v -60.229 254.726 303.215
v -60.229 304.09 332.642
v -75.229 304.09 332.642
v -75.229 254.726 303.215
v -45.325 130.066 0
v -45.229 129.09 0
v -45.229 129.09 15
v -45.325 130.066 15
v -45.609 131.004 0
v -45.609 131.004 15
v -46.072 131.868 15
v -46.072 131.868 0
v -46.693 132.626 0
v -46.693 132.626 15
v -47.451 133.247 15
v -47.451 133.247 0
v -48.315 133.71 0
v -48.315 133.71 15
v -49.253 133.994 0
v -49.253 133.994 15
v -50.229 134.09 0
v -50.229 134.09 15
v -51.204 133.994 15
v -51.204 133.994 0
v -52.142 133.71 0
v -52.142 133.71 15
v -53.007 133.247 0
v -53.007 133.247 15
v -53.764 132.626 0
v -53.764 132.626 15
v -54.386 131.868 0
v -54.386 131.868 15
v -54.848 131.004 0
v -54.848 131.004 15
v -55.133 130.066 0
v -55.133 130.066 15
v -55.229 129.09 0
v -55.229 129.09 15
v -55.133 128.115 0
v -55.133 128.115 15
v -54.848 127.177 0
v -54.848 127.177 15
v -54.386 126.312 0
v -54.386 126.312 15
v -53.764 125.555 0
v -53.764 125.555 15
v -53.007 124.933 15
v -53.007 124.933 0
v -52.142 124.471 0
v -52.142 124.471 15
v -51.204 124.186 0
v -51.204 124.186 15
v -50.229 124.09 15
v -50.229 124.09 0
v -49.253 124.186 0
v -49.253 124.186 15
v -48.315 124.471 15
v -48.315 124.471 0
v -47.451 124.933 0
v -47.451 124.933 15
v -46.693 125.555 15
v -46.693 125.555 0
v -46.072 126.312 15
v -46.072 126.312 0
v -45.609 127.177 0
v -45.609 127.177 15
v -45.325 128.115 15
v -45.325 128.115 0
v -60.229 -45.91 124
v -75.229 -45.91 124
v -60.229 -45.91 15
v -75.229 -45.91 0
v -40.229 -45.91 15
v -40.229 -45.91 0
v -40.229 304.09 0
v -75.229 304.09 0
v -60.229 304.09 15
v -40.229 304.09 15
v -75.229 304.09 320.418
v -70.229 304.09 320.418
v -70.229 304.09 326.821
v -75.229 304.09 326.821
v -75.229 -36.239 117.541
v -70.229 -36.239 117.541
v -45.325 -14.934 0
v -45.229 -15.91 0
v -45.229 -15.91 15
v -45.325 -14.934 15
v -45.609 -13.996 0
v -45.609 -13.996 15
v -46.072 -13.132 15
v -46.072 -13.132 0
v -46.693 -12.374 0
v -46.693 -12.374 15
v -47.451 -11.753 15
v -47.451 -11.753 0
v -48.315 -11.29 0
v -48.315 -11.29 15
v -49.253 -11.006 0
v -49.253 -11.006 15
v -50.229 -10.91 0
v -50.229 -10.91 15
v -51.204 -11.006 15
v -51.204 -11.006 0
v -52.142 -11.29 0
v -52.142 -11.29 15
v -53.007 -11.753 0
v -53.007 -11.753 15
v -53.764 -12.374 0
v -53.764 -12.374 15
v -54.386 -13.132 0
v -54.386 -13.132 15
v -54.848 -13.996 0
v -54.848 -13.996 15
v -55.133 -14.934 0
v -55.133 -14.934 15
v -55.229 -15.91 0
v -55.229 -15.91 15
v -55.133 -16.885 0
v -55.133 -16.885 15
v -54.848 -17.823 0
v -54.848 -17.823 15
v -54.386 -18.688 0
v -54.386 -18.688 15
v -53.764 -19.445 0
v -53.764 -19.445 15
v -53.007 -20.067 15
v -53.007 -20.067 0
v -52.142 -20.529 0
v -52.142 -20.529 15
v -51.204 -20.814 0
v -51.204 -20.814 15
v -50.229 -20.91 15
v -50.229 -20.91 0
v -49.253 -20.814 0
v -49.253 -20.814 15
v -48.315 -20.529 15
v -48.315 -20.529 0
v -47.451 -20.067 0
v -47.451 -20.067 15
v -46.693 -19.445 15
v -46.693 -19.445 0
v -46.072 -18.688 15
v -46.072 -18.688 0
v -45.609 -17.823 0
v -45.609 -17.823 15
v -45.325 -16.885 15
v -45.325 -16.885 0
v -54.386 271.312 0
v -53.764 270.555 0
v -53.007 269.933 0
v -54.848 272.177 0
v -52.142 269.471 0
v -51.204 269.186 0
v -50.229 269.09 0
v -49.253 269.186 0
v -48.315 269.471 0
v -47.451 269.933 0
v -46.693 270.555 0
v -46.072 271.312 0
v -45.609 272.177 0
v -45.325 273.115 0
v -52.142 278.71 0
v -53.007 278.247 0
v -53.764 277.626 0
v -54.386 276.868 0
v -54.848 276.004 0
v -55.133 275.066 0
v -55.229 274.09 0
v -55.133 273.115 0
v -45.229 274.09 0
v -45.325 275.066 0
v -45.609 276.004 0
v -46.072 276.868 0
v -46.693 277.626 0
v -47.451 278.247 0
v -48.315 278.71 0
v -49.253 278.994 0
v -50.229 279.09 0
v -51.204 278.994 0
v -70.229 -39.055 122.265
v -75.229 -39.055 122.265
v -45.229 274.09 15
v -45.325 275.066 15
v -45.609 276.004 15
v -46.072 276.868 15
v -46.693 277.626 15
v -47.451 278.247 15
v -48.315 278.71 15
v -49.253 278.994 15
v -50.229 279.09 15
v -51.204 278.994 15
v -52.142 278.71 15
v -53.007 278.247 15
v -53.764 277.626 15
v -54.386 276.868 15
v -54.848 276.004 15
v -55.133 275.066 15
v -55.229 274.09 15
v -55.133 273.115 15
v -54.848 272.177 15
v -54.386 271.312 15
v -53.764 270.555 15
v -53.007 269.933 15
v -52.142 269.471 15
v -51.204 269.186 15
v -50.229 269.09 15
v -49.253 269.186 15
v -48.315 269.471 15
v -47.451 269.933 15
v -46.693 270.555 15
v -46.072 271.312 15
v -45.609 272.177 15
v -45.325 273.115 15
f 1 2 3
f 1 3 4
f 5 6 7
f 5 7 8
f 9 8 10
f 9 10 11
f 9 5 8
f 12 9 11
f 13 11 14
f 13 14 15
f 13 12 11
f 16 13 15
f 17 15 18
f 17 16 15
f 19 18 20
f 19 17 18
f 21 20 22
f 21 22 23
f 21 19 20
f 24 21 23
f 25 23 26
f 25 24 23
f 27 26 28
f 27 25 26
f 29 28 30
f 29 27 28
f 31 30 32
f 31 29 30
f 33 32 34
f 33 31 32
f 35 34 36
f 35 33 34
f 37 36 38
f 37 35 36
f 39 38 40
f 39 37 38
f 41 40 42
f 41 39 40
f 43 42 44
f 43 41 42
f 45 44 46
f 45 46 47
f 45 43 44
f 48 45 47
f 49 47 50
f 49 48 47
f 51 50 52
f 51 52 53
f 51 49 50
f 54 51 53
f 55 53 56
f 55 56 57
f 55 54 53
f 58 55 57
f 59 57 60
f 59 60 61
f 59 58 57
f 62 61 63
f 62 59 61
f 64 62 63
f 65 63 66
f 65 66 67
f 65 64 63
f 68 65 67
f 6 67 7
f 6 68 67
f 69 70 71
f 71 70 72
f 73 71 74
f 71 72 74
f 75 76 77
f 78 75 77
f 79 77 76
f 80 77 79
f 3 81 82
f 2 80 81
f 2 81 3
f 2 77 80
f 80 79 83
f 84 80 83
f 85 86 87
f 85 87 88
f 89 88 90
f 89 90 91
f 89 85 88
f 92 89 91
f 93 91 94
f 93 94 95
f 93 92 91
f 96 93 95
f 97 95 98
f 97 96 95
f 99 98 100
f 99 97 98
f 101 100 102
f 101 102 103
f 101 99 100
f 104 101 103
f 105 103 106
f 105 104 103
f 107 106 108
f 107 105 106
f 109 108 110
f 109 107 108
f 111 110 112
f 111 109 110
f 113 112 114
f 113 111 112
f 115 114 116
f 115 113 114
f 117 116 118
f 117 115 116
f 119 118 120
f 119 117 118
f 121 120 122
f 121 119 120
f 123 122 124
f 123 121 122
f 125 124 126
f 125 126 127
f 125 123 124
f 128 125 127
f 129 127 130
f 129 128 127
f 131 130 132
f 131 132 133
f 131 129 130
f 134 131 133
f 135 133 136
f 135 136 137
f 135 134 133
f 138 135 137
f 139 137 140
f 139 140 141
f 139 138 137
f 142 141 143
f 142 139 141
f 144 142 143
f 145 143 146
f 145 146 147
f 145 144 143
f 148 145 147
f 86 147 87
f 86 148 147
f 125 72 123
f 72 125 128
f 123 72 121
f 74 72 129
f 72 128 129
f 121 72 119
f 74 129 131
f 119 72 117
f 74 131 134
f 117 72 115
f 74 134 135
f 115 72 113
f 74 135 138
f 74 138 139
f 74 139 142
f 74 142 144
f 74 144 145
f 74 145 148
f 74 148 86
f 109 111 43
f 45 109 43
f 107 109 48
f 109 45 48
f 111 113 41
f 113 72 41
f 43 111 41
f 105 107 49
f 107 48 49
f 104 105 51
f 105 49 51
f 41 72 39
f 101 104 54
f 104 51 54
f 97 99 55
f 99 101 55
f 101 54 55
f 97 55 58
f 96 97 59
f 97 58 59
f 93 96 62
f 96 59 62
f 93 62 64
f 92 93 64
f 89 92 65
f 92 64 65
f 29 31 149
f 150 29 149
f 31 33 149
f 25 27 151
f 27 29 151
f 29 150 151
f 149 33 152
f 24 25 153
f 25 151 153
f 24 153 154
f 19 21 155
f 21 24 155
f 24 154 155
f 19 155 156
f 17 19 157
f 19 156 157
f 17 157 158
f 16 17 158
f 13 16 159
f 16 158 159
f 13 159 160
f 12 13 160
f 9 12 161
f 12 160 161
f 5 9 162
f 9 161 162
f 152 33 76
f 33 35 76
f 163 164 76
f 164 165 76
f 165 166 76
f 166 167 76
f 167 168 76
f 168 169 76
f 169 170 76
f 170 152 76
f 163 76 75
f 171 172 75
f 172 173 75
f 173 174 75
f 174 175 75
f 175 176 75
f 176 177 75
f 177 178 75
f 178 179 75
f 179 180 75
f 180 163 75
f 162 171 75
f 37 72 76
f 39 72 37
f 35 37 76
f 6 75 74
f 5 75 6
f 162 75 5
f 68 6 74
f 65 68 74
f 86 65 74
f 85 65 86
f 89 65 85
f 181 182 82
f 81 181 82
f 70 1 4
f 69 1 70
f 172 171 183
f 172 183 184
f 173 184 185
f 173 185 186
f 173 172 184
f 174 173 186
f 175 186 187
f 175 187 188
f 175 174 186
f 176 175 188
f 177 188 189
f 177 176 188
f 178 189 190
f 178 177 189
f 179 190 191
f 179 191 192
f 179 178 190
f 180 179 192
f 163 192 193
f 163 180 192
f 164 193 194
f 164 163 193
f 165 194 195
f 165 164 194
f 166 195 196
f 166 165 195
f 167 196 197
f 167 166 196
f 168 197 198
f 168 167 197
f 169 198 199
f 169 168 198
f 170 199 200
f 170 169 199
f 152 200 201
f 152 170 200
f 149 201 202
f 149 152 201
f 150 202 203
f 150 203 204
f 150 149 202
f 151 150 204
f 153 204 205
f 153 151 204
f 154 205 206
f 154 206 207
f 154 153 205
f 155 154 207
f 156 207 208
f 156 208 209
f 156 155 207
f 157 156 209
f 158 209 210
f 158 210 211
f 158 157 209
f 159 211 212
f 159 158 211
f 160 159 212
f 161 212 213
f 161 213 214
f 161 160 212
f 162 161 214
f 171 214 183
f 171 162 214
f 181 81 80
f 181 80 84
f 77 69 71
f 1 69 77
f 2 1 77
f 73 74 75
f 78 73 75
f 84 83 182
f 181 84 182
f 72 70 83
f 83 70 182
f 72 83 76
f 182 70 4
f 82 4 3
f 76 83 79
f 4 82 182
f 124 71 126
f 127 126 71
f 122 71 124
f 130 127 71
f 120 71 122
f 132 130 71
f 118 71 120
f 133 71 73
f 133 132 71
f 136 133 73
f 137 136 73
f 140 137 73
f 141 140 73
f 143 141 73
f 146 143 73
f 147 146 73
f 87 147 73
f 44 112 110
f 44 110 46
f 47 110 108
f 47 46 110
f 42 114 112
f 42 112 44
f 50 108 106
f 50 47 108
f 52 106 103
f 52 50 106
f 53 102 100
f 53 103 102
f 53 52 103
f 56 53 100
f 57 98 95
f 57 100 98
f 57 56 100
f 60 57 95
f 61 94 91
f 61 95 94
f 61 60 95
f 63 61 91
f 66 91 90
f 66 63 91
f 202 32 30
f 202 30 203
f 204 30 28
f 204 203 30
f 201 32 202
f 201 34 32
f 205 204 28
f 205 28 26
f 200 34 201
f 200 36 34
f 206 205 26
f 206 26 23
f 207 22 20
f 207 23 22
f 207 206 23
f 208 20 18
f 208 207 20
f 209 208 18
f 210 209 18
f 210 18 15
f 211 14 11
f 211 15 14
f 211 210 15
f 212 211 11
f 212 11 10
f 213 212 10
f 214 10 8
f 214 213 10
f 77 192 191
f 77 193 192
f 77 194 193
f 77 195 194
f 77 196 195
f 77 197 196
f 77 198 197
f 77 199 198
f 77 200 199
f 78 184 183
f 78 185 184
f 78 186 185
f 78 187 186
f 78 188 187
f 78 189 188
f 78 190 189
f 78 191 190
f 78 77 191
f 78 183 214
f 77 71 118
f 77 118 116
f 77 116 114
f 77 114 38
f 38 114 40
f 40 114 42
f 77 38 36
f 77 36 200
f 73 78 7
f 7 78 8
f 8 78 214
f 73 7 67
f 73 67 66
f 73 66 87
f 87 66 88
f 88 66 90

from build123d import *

# Parameters (mm, degrees)
F0_W     = 35
F0_H     = 350
F0_R     = 5
F1_DEPTH = 15
F2_W     = 15
F2_H     = 350
F3_DEPTH = 109
F5_DEPTH = 15
F7_DEPTH = 5


with BuildPart() as f1:
    # F0 (on Top) → F1 (new body)
    with BuildSketch(Plane.XY):
        with Locations((-57.72887, 129.090141)):
            Rectangle(F0_W, F0_H)
        with Locations((-50.22887, -15.909859)):
            Circle(F0_R, mode=Mode.SUBTRACT)
        with Locations((-50.22887, 129.090141)):
            Circle(F0_R, mode=Mode.SUBTRACT)
        with Locations((-50.22887, 274.090141)):
            Circle(F0_R, mode=Mode.SUBTRACT)
    extrude(amount=F1_DEPTH)

    # F2 (on face) → F3 (join)
    with BuildSketch(Plane.XY.offset(15)):
        with Locations((-67.72887, 129.090141)):
            Rectangle(F2_W, F2_H)
    extrude(amount=F3_DEPTH)

    # F4 (on face) → F5 (join)
    with BuildSketch(Plane.YZ.offset(-60.22887)):
        Polygon((254.726105, 303.215003), (-45.909859, 124), (304.090141, 124), (304.090141, 332.641874), align=None)
    extrude(amount=-F5_DEPTH)

    # F6 (on face) → F7 (cut)
    with BuildSketch(Plane(origin=(-75.22887, 0, 0), x_dir=(0, -1, 0), z_dir=(-1, 0, 0))):
        Polygon((36.23861, 117.541139), (39.054846, 122.265419), (-304.090141, 326.820885), (-304.090141, 320.417792), align=None)
    extrude(amount=-F7_DEPTH, mode=Mode.SUBTRACT)


solid = f1.part
